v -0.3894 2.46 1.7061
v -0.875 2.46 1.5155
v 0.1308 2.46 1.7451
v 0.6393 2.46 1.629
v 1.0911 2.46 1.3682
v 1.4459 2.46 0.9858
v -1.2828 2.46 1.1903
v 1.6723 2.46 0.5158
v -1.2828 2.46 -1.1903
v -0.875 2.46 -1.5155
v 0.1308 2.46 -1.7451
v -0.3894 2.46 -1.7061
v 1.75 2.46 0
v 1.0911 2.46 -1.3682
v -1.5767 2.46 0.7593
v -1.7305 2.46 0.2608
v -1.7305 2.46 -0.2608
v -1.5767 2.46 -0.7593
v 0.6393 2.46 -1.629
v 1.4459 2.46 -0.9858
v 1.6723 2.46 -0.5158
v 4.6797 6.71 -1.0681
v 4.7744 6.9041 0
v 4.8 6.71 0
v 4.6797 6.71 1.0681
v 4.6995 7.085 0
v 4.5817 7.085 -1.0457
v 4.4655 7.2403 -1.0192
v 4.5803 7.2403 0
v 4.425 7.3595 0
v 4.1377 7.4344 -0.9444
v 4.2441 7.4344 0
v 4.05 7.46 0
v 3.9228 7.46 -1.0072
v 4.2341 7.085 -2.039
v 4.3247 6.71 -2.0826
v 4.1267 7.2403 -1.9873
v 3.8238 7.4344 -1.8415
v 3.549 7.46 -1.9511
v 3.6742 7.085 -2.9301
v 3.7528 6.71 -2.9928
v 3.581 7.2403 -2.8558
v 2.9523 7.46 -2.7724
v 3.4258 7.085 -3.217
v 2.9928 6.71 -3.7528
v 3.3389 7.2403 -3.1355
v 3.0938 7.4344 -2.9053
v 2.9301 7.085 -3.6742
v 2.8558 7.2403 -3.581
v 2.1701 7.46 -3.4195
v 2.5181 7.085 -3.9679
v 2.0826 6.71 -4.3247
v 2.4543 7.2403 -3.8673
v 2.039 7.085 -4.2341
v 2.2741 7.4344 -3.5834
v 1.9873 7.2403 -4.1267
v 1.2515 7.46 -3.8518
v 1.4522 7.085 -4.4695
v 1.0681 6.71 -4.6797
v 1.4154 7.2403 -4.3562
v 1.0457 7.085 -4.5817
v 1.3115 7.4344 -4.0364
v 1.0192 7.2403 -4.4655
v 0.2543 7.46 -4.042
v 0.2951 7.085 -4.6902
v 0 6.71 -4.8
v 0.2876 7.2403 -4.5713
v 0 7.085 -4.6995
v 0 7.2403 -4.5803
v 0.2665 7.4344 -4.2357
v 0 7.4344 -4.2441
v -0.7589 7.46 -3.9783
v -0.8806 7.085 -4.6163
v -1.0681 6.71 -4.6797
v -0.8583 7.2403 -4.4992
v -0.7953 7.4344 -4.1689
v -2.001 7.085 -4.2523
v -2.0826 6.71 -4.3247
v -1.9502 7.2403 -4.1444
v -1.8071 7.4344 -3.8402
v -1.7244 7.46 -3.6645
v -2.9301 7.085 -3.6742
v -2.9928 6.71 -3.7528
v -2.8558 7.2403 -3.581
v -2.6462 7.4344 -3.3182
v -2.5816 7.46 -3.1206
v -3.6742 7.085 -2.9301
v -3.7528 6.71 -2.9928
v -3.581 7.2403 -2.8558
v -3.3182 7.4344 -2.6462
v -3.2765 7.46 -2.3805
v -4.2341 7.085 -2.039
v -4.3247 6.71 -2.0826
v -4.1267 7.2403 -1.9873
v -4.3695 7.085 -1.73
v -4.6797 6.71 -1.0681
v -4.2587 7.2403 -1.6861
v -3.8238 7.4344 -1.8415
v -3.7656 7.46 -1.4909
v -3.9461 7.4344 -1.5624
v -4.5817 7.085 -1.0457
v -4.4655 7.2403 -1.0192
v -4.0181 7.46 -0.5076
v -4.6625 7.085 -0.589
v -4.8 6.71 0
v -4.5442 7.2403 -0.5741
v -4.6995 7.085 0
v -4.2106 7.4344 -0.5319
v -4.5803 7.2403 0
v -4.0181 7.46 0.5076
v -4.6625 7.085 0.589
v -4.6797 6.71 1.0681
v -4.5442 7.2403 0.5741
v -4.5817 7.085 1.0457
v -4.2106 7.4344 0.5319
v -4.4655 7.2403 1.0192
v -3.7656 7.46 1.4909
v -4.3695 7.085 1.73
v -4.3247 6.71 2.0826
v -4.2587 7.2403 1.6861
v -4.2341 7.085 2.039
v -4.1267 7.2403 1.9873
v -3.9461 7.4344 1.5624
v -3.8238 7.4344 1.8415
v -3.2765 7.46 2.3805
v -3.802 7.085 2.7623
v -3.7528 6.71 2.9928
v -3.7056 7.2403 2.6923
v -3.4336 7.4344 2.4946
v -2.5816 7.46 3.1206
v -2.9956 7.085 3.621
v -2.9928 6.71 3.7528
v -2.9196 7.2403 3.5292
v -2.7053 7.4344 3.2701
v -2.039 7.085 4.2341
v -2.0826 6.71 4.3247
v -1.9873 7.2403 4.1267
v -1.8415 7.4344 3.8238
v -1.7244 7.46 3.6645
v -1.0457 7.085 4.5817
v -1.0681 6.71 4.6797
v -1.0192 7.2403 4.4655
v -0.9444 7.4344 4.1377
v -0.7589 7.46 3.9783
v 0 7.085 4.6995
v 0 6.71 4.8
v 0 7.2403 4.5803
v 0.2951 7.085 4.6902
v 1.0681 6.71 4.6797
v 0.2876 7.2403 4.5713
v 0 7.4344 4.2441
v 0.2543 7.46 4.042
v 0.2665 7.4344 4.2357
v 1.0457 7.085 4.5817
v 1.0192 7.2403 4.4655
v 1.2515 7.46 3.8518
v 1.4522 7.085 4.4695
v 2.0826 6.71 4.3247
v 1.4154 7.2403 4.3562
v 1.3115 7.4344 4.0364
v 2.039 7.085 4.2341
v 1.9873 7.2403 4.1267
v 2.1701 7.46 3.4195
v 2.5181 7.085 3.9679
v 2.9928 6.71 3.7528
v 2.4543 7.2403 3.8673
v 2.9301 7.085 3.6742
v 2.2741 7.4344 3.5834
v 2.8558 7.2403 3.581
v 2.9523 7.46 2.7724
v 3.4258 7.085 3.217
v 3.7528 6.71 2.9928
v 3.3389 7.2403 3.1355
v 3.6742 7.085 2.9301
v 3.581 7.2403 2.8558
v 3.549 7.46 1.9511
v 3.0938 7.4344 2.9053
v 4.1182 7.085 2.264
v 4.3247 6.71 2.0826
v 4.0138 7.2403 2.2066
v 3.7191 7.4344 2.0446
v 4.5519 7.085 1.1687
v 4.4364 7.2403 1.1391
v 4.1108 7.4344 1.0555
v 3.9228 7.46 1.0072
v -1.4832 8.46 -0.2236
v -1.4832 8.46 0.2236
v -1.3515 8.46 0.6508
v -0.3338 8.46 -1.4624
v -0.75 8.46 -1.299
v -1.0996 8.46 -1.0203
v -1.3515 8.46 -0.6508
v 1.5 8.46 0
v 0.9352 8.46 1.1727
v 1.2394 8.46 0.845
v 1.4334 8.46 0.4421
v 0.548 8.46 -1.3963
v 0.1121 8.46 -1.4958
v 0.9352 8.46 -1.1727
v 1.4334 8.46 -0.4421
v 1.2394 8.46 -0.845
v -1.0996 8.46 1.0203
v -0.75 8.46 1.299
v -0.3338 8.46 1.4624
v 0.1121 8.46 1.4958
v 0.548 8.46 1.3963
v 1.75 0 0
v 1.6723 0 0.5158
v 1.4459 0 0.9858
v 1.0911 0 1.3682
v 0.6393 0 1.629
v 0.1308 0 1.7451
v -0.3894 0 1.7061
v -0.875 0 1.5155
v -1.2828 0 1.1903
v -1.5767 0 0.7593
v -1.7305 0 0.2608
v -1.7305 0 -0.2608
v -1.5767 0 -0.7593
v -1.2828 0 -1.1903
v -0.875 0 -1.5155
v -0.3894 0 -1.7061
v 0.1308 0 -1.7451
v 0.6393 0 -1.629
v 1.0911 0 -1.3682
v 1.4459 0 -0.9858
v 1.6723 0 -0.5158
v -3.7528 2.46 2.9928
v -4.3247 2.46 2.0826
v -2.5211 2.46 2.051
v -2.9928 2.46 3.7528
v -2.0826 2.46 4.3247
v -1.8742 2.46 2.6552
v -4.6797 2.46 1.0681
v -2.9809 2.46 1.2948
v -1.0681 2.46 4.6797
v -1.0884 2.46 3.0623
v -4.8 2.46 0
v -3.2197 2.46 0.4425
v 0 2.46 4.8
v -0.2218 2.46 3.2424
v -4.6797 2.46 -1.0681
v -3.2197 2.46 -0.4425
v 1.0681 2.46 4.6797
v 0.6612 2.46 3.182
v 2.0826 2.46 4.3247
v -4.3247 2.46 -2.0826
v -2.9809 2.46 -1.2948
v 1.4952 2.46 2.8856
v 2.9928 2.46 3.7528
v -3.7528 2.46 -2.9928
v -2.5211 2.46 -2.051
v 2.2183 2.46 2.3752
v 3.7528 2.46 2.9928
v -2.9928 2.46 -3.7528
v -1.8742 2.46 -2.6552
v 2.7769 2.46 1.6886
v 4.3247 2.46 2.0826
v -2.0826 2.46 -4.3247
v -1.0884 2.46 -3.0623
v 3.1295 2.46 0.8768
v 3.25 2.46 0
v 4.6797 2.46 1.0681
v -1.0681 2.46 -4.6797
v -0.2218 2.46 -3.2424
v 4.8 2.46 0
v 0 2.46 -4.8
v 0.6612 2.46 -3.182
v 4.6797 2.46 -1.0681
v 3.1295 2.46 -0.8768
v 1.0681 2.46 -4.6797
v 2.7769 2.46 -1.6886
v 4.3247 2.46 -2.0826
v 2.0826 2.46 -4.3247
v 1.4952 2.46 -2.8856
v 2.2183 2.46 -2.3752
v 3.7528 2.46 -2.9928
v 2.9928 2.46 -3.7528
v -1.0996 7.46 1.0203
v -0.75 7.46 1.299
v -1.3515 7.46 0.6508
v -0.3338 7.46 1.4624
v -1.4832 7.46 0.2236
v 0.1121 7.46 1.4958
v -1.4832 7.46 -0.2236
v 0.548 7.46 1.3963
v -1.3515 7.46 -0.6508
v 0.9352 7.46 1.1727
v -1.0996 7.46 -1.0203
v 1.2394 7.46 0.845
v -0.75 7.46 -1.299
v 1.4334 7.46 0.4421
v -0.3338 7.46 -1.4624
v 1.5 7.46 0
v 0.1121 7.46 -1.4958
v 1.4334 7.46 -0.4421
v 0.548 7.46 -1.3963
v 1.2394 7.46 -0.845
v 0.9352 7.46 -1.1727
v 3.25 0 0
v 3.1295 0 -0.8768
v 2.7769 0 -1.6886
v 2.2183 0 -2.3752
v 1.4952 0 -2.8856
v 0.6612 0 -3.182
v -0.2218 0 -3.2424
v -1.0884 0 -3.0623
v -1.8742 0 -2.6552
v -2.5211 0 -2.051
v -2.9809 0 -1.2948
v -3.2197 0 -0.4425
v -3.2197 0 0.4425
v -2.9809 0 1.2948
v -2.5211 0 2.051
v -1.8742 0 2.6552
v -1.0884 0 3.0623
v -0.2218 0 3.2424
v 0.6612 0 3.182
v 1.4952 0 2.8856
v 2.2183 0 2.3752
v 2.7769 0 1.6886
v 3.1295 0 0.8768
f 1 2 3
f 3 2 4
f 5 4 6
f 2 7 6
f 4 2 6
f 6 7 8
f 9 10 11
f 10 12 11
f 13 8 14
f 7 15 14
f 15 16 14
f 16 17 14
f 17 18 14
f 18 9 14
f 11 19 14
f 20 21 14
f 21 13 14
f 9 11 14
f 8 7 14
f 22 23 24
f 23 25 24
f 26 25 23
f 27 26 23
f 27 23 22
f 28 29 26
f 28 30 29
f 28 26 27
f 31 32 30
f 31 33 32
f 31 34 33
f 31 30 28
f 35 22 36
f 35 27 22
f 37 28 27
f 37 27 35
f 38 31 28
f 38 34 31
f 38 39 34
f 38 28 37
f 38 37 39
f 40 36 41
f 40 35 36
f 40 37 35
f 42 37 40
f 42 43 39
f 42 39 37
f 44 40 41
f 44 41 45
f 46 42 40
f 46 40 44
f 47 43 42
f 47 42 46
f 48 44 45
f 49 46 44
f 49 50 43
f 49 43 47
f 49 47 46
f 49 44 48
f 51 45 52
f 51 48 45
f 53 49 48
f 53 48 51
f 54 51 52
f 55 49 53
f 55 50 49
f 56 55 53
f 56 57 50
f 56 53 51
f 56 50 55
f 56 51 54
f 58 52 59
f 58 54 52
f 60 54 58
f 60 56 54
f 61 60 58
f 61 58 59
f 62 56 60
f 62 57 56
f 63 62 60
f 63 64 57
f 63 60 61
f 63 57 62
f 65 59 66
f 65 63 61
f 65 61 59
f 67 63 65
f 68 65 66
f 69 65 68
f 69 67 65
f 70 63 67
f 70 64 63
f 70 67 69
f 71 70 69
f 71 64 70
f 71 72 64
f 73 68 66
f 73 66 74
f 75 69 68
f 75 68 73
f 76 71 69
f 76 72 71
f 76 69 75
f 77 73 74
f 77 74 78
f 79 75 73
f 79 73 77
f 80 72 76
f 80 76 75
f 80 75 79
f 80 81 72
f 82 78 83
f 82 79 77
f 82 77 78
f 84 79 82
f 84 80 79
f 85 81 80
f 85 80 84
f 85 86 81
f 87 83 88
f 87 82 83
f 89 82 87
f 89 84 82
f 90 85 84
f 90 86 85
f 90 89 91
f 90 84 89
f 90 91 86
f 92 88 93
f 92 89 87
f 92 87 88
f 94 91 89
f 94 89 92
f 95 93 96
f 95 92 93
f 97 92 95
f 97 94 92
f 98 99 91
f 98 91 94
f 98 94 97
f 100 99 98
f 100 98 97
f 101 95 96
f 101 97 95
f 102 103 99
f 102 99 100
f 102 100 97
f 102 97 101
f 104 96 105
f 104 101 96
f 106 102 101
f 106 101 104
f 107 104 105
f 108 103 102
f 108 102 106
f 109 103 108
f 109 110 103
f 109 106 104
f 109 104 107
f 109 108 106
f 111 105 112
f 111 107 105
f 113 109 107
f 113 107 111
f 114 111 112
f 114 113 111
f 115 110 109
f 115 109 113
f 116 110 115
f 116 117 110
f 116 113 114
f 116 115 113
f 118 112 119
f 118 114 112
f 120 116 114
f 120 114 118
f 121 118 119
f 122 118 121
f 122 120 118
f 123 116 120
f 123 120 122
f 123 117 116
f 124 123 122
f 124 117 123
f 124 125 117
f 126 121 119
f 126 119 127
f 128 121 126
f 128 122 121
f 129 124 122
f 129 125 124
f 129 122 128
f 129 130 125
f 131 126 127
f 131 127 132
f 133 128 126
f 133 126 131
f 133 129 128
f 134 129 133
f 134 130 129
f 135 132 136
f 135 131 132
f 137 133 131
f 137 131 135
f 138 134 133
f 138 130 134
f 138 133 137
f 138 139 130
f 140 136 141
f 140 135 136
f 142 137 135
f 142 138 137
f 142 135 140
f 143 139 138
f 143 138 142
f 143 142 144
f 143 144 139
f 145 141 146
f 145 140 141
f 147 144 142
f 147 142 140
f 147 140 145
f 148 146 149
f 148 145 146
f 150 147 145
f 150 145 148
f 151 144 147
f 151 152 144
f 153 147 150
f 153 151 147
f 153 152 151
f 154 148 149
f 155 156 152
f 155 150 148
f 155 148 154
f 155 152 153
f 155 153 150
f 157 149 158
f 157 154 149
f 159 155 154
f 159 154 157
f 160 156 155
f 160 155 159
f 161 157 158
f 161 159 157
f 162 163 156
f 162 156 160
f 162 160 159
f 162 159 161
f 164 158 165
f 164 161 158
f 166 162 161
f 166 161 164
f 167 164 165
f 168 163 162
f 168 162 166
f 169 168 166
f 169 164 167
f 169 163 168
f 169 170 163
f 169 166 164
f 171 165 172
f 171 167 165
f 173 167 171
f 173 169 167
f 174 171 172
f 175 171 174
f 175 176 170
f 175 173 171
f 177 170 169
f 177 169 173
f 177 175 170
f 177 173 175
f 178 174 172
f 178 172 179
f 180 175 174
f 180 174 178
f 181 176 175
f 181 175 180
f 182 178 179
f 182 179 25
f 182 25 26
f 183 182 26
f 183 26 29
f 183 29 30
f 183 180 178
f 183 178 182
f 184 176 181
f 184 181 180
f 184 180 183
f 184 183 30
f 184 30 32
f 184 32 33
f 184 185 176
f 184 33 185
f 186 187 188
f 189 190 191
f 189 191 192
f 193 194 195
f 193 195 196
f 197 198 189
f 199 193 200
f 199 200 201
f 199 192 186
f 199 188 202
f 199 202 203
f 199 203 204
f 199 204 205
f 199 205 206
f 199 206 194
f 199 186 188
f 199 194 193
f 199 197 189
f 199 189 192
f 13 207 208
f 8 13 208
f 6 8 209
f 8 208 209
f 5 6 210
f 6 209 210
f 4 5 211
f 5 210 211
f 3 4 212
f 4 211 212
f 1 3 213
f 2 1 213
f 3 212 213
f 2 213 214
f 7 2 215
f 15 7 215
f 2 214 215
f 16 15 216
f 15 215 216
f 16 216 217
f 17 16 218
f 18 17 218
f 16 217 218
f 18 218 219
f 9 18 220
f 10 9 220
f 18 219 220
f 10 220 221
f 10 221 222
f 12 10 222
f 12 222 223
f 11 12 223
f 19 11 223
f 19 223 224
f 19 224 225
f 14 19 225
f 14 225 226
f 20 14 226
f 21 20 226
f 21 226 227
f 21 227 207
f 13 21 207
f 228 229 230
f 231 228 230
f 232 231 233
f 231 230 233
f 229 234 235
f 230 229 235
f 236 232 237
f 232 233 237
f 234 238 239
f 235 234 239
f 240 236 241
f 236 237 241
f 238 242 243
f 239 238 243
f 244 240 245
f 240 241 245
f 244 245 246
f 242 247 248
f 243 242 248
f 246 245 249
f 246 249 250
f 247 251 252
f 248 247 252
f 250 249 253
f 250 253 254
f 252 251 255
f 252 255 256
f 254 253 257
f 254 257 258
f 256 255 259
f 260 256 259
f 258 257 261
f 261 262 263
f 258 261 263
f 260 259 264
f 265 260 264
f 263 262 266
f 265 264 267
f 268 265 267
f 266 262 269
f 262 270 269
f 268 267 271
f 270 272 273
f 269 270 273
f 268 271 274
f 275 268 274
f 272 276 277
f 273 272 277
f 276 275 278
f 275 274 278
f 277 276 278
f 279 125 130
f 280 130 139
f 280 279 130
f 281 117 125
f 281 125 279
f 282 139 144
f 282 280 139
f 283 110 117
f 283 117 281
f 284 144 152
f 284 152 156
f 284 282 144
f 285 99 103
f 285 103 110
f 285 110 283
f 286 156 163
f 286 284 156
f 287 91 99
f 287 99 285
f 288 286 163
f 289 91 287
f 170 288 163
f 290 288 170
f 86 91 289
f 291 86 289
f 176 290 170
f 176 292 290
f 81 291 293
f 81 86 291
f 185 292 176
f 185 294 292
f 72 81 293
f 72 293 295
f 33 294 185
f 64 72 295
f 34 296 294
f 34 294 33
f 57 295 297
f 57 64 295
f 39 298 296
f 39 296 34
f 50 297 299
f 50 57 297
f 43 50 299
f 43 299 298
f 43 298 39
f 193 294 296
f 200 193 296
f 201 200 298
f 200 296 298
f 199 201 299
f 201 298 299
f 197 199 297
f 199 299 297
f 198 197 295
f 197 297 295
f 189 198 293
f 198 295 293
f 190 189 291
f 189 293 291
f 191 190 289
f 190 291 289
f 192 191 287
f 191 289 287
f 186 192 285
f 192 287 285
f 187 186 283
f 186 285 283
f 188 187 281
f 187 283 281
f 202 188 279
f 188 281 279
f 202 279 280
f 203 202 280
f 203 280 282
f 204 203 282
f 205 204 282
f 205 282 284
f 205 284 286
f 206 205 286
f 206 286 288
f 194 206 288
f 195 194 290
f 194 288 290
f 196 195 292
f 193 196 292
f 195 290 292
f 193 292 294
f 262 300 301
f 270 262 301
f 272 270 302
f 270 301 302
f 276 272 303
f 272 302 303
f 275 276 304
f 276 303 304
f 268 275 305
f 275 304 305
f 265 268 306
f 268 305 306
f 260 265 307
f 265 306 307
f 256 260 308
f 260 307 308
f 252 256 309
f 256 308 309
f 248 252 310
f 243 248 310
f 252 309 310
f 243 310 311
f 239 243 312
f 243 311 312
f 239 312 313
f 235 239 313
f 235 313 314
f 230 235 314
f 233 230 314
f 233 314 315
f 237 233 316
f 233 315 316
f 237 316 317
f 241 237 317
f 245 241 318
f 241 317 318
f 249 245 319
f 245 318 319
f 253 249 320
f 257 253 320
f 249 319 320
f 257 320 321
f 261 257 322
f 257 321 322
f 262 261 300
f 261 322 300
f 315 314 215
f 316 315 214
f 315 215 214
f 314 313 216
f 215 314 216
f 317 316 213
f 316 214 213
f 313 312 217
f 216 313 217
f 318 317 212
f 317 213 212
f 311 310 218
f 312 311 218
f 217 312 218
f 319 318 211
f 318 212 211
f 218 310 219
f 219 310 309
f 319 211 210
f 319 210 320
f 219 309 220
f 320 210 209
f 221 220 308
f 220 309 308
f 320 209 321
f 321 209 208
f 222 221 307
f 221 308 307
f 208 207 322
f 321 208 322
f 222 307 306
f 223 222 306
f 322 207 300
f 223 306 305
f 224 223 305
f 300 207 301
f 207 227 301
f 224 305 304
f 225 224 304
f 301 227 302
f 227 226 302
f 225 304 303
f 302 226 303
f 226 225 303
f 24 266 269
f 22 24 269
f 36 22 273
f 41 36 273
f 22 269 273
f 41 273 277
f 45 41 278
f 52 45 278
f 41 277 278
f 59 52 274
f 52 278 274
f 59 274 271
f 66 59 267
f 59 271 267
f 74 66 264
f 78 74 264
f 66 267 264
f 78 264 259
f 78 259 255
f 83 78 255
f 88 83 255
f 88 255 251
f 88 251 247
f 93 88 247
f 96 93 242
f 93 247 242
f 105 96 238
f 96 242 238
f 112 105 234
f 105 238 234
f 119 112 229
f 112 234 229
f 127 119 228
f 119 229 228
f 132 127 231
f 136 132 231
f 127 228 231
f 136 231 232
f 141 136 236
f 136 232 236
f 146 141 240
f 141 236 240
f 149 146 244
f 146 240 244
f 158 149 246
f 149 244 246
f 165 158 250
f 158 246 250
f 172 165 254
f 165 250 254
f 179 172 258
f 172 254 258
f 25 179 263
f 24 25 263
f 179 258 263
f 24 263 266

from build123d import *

# Parameters (mm, degrees)
SKETCH1_R           = 3.25
BOSS_EXTRUDE1_DEPTH = 2.46
SKETCH2_R           = 1.75
CUT_EXTRUDE1_DEPTH  = 2.5
SKETCH6_R           = 4.8
BOSS_EXTRUDE2_DEPTH = 5
FILLET2_R           = 0.75
SKETCH7_R           = 1.5
BOSS_EXTRUDE3_DEPTH = 1


with BuildPart() as part:
    # Sketch1 → Boss-Extrude1 (new body)
    with BuildSketch(Plane(origin=(0, 0, 0), x_dir=(1, 0, 0), z_dir=(0, 1, 0))):
        Circle(SKETCH1_R)
    extrude(amount=BOSS_EXTRUDE1_DEPTH)

    # Sketch2 → Cut-Extrude1 (cut)
    with BuildSketch(Plane.XZ):
        Circle(SKETCH2_R)
    extrude(amount=-CUT_EXTRUDE1_DEPTH, mode=Mode.SUBTRACT)

    # Sketch6 → Boss-Extrude2 (add)
    with BuildSketch(Plane(origin=(0, 2.46, 0), x_dir=(1, 0, 0), z_dir=(0, 1, 0))):
        Circle(SKETCH6_R)
    extrude(amount=BOSS_EXTRUDE2_DEPTH)

    # Fillet2
    fillet2_edges = [part.edges().sort_by_distance(p)[0] for p in [
        (-4.8, 7.46, 0),
    ]]
    fillet(fillet2_edges, radius=FILLET2_R)

    # Sketch7 → Boss-Extrude3 (add)
    with BuildSketch(Plane(origin=(0, 7.46, 0), x_dir=(1, 0, 0), z_dir=(0, 1, 0))):
        Circle(SKETCH7_R)
    extrude(amount=BOSS_EXTRUDE3_DEPTH)


solid = part.part
